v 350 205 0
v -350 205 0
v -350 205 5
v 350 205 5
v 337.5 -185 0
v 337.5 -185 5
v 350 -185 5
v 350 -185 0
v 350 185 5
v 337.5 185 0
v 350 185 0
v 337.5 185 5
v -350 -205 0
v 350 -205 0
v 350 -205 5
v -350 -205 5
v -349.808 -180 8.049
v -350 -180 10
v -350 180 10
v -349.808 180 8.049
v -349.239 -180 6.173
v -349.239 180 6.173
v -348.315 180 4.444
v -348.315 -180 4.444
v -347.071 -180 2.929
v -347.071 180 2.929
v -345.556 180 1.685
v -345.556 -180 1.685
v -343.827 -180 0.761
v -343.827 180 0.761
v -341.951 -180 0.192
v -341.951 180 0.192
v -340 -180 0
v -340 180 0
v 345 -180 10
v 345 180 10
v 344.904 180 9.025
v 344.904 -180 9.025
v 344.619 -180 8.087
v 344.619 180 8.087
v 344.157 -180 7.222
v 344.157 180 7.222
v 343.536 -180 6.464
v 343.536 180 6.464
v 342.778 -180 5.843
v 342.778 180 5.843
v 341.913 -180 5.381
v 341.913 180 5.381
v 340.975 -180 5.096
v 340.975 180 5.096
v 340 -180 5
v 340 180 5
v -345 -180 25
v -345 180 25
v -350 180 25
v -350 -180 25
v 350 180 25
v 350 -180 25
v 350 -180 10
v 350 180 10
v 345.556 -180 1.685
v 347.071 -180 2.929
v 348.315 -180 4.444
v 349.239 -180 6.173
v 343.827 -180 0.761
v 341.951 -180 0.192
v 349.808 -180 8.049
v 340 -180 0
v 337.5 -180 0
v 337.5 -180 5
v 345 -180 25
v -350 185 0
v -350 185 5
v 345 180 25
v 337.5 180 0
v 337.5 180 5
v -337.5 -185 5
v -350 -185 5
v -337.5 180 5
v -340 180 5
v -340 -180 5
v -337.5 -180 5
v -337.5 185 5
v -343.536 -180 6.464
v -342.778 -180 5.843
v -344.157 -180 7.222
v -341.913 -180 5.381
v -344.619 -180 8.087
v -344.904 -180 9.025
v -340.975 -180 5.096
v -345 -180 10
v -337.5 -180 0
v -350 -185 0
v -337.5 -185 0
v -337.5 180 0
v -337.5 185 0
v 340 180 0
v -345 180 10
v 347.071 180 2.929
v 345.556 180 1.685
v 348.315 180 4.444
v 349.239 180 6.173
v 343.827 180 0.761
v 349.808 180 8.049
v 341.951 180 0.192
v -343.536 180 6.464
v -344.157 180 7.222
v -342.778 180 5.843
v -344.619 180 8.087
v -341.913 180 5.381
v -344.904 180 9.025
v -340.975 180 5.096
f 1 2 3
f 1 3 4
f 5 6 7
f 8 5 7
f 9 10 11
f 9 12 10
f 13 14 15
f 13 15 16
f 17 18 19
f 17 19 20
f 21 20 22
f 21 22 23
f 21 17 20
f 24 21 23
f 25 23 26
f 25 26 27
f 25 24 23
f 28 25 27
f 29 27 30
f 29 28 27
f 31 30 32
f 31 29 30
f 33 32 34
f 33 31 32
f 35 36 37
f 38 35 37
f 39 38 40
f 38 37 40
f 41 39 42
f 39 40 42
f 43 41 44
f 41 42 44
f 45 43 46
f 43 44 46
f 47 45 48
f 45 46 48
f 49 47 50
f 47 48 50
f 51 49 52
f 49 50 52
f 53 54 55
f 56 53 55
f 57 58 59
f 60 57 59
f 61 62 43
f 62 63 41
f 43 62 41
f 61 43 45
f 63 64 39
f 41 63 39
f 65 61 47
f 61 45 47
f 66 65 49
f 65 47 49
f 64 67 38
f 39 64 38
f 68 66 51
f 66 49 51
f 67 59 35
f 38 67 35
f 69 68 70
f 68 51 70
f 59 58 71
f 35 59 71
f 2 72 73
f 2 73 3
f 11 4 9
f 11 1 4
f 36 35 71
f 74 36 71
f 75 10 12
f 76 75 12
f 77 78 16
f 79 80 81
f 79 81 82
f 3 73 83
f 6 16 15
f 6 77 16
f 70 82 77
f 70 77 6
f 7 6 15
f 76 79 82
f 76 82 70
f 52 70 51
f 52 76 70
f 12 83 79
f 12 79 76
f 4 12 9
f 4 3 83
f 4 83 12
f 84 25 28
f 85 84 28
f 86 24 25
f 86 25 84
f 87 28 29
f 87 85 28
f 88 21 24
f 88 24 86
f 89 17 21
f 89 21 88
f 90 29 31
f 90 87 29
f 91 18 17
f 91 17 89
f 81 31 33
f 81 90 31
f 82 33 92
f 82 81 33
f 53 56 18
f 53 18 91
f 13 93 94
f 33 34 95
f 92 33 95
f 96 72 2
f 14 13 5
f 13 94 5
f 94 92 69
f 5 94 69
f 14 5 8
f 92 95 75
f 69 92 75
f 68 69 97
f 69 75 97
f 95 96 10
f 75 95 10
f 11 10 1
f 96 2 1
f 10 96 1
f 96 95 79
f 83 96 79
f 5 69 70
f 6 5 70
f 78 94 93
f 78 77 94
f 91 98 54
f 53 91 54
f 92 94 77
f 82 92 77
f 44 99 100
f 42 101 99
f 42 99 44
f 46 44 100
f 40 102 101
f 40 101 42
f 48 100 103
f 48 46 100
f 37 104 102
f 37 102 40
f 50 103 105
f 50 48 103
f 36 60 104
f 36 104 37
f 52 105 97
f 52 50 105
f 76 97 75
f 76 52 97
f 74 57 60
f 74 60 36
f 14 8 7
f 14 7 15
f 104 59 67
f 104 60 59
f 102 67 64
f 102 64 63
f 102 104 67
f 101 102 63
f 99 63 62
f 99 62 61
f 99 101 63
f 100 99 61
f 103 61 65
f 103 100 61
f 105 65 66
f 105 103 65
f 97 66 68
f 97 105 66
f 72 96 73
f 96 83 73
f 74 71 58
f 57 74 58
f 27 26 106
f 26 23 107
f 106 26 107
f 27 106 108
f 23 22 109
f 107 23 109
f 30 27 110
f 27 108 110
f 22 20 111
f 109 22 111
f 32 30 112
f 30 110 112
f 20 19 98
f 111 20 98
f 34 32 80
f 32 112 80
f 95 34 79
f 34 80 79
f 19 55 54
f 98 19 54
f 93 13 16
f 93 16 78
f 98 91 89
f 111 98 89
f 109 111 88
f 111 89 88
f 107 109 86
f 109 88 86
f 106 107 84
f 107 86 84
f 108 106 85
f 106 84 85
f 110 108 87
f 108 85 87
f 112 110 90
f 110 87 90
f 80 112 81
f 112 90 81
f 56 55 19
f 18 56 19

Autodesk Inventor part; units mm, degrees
ref_plane "YZ Plane" through (0, 0, 0) normal (1, 0, 0) x (0, 1, 0)
ref_plane "XZ Plane" through (0, 0, 0) normal (0, 1, 0) x (-1, 0, 0)
ref_plane "XY Plane" through (0, 0, 0) normal (0, 0, 1) x (1, 0, 0)
sketch "Boceto1" plane through (0, 0, 0) normal (0, 0, 1) x (1, 0, 0)
  line L0 (-350, 205) -> (350, 205)
  line L1 (350, 205) -> (350, -205)
  line L2 (350, -205) -> (-350, -205)
  line L3 (-350, -205) -> (-350, 205)
  line L4 (-350, 205) -> (350, -205) construction
  line L5 (350, 205) -> (-350, -205) construction
  point P0 (0, 0)
  dimension "d0" = 700
  dimension "d1" = 410
extrude "Placa1" add sketch "Boceto1" along normal blind 5
sketch "Boceto2" plane through (-345, -205, 0) normal (-1, 0, 0) x (0, -1, 0)
  line L0 (-385, 0) -> (-25, 0)
  line L1 (-25, 0) -> (-25, 25)
  line L2 (-25, 25) -> (-385, 25)
  line L3 (-385, 25) -> (-385, 0)
edge flange "Pestaña1" height 25 angle 90 thickness 5 bend radius 5 thickness toward (-1, 0, 0) relief straight relief width 5 relief depth 2.5 edges at (-350, 0, 5) wall of the first edge with corners at (-345, 180, 0) (-345, -180, 0) (-345, -180, 25) (-345, 180, 25)
bend "Doblez1"
corner "Esquina1"
sketch "Boceto3" plane through (345, 205, 0) normal (1, 0, 0) x (0, 1, 0)
  line L0 (-385, 0) -> (-25, 0)
  line L1 (-25, 0) -> (-25, 25)
  line L2 (-25, 25) -> (-385, 25)
  line L3 (-385, 25) -> (-385, 0)
edge flange "Pestaña2" height 25 angle 90 thickness 5 bend radius 5 thickness toward (1, 0, 0) relief straight relief width 5 relief depth 2.5 edges at (350, 0, 5) wall of the first edge with corners at (345, -180, 0) (345, 180, 0) (345, 180, 25) (345, -180, 25)
bend "Doblez2"
corner "Esquina2"
equation "\"d2\" = Thickness"
equation "\"d3\" = BendReliefWidth"
equation "\"d4\" = BendReliefDepth"
equation "\"d5\" = MinimumRemnant"
equation "\"d6\" = TransitionRadius"
equation "\"d10\" = BendRadius"
equation "\"d11\" = CornerReliefSize"
equation "\"d12\" = GapSize"
equation "\"d13\" = JacobiRadiusSize"
equation "\"d14\" = BendReliefWidth"
equation "\"d15\" = BendReliefDepth"
equation "\"d16\" = MinimumRemnant"
equation "\"d17\" = TransitionRadius"
equation "\"d21\" = BendRadius"
equation "\"d22\" = CornerReliefSize"
equation "\"d23\" = GapSize"
equation "\"d24\" = JacobiRadiusSize"
equation "\"BendRadius\" = Thickness"
equation "\"BendReliefWidth\" = Thickness"
equation "\"BendReliefDepth\" = 0.5 * Thickness"
equation "\"TransitionRadius\" = BendRadius"
equation "\"JacobiRadiusSize\" = BendRadius"
equation "\"GapSize\" = Thickness"
equation "\"Thickness\" = 5"
equation "\"MinimumRemnant\" = 10"
equation "\"CornerReliefSize\" = 20"
properties part number "Fondo"
